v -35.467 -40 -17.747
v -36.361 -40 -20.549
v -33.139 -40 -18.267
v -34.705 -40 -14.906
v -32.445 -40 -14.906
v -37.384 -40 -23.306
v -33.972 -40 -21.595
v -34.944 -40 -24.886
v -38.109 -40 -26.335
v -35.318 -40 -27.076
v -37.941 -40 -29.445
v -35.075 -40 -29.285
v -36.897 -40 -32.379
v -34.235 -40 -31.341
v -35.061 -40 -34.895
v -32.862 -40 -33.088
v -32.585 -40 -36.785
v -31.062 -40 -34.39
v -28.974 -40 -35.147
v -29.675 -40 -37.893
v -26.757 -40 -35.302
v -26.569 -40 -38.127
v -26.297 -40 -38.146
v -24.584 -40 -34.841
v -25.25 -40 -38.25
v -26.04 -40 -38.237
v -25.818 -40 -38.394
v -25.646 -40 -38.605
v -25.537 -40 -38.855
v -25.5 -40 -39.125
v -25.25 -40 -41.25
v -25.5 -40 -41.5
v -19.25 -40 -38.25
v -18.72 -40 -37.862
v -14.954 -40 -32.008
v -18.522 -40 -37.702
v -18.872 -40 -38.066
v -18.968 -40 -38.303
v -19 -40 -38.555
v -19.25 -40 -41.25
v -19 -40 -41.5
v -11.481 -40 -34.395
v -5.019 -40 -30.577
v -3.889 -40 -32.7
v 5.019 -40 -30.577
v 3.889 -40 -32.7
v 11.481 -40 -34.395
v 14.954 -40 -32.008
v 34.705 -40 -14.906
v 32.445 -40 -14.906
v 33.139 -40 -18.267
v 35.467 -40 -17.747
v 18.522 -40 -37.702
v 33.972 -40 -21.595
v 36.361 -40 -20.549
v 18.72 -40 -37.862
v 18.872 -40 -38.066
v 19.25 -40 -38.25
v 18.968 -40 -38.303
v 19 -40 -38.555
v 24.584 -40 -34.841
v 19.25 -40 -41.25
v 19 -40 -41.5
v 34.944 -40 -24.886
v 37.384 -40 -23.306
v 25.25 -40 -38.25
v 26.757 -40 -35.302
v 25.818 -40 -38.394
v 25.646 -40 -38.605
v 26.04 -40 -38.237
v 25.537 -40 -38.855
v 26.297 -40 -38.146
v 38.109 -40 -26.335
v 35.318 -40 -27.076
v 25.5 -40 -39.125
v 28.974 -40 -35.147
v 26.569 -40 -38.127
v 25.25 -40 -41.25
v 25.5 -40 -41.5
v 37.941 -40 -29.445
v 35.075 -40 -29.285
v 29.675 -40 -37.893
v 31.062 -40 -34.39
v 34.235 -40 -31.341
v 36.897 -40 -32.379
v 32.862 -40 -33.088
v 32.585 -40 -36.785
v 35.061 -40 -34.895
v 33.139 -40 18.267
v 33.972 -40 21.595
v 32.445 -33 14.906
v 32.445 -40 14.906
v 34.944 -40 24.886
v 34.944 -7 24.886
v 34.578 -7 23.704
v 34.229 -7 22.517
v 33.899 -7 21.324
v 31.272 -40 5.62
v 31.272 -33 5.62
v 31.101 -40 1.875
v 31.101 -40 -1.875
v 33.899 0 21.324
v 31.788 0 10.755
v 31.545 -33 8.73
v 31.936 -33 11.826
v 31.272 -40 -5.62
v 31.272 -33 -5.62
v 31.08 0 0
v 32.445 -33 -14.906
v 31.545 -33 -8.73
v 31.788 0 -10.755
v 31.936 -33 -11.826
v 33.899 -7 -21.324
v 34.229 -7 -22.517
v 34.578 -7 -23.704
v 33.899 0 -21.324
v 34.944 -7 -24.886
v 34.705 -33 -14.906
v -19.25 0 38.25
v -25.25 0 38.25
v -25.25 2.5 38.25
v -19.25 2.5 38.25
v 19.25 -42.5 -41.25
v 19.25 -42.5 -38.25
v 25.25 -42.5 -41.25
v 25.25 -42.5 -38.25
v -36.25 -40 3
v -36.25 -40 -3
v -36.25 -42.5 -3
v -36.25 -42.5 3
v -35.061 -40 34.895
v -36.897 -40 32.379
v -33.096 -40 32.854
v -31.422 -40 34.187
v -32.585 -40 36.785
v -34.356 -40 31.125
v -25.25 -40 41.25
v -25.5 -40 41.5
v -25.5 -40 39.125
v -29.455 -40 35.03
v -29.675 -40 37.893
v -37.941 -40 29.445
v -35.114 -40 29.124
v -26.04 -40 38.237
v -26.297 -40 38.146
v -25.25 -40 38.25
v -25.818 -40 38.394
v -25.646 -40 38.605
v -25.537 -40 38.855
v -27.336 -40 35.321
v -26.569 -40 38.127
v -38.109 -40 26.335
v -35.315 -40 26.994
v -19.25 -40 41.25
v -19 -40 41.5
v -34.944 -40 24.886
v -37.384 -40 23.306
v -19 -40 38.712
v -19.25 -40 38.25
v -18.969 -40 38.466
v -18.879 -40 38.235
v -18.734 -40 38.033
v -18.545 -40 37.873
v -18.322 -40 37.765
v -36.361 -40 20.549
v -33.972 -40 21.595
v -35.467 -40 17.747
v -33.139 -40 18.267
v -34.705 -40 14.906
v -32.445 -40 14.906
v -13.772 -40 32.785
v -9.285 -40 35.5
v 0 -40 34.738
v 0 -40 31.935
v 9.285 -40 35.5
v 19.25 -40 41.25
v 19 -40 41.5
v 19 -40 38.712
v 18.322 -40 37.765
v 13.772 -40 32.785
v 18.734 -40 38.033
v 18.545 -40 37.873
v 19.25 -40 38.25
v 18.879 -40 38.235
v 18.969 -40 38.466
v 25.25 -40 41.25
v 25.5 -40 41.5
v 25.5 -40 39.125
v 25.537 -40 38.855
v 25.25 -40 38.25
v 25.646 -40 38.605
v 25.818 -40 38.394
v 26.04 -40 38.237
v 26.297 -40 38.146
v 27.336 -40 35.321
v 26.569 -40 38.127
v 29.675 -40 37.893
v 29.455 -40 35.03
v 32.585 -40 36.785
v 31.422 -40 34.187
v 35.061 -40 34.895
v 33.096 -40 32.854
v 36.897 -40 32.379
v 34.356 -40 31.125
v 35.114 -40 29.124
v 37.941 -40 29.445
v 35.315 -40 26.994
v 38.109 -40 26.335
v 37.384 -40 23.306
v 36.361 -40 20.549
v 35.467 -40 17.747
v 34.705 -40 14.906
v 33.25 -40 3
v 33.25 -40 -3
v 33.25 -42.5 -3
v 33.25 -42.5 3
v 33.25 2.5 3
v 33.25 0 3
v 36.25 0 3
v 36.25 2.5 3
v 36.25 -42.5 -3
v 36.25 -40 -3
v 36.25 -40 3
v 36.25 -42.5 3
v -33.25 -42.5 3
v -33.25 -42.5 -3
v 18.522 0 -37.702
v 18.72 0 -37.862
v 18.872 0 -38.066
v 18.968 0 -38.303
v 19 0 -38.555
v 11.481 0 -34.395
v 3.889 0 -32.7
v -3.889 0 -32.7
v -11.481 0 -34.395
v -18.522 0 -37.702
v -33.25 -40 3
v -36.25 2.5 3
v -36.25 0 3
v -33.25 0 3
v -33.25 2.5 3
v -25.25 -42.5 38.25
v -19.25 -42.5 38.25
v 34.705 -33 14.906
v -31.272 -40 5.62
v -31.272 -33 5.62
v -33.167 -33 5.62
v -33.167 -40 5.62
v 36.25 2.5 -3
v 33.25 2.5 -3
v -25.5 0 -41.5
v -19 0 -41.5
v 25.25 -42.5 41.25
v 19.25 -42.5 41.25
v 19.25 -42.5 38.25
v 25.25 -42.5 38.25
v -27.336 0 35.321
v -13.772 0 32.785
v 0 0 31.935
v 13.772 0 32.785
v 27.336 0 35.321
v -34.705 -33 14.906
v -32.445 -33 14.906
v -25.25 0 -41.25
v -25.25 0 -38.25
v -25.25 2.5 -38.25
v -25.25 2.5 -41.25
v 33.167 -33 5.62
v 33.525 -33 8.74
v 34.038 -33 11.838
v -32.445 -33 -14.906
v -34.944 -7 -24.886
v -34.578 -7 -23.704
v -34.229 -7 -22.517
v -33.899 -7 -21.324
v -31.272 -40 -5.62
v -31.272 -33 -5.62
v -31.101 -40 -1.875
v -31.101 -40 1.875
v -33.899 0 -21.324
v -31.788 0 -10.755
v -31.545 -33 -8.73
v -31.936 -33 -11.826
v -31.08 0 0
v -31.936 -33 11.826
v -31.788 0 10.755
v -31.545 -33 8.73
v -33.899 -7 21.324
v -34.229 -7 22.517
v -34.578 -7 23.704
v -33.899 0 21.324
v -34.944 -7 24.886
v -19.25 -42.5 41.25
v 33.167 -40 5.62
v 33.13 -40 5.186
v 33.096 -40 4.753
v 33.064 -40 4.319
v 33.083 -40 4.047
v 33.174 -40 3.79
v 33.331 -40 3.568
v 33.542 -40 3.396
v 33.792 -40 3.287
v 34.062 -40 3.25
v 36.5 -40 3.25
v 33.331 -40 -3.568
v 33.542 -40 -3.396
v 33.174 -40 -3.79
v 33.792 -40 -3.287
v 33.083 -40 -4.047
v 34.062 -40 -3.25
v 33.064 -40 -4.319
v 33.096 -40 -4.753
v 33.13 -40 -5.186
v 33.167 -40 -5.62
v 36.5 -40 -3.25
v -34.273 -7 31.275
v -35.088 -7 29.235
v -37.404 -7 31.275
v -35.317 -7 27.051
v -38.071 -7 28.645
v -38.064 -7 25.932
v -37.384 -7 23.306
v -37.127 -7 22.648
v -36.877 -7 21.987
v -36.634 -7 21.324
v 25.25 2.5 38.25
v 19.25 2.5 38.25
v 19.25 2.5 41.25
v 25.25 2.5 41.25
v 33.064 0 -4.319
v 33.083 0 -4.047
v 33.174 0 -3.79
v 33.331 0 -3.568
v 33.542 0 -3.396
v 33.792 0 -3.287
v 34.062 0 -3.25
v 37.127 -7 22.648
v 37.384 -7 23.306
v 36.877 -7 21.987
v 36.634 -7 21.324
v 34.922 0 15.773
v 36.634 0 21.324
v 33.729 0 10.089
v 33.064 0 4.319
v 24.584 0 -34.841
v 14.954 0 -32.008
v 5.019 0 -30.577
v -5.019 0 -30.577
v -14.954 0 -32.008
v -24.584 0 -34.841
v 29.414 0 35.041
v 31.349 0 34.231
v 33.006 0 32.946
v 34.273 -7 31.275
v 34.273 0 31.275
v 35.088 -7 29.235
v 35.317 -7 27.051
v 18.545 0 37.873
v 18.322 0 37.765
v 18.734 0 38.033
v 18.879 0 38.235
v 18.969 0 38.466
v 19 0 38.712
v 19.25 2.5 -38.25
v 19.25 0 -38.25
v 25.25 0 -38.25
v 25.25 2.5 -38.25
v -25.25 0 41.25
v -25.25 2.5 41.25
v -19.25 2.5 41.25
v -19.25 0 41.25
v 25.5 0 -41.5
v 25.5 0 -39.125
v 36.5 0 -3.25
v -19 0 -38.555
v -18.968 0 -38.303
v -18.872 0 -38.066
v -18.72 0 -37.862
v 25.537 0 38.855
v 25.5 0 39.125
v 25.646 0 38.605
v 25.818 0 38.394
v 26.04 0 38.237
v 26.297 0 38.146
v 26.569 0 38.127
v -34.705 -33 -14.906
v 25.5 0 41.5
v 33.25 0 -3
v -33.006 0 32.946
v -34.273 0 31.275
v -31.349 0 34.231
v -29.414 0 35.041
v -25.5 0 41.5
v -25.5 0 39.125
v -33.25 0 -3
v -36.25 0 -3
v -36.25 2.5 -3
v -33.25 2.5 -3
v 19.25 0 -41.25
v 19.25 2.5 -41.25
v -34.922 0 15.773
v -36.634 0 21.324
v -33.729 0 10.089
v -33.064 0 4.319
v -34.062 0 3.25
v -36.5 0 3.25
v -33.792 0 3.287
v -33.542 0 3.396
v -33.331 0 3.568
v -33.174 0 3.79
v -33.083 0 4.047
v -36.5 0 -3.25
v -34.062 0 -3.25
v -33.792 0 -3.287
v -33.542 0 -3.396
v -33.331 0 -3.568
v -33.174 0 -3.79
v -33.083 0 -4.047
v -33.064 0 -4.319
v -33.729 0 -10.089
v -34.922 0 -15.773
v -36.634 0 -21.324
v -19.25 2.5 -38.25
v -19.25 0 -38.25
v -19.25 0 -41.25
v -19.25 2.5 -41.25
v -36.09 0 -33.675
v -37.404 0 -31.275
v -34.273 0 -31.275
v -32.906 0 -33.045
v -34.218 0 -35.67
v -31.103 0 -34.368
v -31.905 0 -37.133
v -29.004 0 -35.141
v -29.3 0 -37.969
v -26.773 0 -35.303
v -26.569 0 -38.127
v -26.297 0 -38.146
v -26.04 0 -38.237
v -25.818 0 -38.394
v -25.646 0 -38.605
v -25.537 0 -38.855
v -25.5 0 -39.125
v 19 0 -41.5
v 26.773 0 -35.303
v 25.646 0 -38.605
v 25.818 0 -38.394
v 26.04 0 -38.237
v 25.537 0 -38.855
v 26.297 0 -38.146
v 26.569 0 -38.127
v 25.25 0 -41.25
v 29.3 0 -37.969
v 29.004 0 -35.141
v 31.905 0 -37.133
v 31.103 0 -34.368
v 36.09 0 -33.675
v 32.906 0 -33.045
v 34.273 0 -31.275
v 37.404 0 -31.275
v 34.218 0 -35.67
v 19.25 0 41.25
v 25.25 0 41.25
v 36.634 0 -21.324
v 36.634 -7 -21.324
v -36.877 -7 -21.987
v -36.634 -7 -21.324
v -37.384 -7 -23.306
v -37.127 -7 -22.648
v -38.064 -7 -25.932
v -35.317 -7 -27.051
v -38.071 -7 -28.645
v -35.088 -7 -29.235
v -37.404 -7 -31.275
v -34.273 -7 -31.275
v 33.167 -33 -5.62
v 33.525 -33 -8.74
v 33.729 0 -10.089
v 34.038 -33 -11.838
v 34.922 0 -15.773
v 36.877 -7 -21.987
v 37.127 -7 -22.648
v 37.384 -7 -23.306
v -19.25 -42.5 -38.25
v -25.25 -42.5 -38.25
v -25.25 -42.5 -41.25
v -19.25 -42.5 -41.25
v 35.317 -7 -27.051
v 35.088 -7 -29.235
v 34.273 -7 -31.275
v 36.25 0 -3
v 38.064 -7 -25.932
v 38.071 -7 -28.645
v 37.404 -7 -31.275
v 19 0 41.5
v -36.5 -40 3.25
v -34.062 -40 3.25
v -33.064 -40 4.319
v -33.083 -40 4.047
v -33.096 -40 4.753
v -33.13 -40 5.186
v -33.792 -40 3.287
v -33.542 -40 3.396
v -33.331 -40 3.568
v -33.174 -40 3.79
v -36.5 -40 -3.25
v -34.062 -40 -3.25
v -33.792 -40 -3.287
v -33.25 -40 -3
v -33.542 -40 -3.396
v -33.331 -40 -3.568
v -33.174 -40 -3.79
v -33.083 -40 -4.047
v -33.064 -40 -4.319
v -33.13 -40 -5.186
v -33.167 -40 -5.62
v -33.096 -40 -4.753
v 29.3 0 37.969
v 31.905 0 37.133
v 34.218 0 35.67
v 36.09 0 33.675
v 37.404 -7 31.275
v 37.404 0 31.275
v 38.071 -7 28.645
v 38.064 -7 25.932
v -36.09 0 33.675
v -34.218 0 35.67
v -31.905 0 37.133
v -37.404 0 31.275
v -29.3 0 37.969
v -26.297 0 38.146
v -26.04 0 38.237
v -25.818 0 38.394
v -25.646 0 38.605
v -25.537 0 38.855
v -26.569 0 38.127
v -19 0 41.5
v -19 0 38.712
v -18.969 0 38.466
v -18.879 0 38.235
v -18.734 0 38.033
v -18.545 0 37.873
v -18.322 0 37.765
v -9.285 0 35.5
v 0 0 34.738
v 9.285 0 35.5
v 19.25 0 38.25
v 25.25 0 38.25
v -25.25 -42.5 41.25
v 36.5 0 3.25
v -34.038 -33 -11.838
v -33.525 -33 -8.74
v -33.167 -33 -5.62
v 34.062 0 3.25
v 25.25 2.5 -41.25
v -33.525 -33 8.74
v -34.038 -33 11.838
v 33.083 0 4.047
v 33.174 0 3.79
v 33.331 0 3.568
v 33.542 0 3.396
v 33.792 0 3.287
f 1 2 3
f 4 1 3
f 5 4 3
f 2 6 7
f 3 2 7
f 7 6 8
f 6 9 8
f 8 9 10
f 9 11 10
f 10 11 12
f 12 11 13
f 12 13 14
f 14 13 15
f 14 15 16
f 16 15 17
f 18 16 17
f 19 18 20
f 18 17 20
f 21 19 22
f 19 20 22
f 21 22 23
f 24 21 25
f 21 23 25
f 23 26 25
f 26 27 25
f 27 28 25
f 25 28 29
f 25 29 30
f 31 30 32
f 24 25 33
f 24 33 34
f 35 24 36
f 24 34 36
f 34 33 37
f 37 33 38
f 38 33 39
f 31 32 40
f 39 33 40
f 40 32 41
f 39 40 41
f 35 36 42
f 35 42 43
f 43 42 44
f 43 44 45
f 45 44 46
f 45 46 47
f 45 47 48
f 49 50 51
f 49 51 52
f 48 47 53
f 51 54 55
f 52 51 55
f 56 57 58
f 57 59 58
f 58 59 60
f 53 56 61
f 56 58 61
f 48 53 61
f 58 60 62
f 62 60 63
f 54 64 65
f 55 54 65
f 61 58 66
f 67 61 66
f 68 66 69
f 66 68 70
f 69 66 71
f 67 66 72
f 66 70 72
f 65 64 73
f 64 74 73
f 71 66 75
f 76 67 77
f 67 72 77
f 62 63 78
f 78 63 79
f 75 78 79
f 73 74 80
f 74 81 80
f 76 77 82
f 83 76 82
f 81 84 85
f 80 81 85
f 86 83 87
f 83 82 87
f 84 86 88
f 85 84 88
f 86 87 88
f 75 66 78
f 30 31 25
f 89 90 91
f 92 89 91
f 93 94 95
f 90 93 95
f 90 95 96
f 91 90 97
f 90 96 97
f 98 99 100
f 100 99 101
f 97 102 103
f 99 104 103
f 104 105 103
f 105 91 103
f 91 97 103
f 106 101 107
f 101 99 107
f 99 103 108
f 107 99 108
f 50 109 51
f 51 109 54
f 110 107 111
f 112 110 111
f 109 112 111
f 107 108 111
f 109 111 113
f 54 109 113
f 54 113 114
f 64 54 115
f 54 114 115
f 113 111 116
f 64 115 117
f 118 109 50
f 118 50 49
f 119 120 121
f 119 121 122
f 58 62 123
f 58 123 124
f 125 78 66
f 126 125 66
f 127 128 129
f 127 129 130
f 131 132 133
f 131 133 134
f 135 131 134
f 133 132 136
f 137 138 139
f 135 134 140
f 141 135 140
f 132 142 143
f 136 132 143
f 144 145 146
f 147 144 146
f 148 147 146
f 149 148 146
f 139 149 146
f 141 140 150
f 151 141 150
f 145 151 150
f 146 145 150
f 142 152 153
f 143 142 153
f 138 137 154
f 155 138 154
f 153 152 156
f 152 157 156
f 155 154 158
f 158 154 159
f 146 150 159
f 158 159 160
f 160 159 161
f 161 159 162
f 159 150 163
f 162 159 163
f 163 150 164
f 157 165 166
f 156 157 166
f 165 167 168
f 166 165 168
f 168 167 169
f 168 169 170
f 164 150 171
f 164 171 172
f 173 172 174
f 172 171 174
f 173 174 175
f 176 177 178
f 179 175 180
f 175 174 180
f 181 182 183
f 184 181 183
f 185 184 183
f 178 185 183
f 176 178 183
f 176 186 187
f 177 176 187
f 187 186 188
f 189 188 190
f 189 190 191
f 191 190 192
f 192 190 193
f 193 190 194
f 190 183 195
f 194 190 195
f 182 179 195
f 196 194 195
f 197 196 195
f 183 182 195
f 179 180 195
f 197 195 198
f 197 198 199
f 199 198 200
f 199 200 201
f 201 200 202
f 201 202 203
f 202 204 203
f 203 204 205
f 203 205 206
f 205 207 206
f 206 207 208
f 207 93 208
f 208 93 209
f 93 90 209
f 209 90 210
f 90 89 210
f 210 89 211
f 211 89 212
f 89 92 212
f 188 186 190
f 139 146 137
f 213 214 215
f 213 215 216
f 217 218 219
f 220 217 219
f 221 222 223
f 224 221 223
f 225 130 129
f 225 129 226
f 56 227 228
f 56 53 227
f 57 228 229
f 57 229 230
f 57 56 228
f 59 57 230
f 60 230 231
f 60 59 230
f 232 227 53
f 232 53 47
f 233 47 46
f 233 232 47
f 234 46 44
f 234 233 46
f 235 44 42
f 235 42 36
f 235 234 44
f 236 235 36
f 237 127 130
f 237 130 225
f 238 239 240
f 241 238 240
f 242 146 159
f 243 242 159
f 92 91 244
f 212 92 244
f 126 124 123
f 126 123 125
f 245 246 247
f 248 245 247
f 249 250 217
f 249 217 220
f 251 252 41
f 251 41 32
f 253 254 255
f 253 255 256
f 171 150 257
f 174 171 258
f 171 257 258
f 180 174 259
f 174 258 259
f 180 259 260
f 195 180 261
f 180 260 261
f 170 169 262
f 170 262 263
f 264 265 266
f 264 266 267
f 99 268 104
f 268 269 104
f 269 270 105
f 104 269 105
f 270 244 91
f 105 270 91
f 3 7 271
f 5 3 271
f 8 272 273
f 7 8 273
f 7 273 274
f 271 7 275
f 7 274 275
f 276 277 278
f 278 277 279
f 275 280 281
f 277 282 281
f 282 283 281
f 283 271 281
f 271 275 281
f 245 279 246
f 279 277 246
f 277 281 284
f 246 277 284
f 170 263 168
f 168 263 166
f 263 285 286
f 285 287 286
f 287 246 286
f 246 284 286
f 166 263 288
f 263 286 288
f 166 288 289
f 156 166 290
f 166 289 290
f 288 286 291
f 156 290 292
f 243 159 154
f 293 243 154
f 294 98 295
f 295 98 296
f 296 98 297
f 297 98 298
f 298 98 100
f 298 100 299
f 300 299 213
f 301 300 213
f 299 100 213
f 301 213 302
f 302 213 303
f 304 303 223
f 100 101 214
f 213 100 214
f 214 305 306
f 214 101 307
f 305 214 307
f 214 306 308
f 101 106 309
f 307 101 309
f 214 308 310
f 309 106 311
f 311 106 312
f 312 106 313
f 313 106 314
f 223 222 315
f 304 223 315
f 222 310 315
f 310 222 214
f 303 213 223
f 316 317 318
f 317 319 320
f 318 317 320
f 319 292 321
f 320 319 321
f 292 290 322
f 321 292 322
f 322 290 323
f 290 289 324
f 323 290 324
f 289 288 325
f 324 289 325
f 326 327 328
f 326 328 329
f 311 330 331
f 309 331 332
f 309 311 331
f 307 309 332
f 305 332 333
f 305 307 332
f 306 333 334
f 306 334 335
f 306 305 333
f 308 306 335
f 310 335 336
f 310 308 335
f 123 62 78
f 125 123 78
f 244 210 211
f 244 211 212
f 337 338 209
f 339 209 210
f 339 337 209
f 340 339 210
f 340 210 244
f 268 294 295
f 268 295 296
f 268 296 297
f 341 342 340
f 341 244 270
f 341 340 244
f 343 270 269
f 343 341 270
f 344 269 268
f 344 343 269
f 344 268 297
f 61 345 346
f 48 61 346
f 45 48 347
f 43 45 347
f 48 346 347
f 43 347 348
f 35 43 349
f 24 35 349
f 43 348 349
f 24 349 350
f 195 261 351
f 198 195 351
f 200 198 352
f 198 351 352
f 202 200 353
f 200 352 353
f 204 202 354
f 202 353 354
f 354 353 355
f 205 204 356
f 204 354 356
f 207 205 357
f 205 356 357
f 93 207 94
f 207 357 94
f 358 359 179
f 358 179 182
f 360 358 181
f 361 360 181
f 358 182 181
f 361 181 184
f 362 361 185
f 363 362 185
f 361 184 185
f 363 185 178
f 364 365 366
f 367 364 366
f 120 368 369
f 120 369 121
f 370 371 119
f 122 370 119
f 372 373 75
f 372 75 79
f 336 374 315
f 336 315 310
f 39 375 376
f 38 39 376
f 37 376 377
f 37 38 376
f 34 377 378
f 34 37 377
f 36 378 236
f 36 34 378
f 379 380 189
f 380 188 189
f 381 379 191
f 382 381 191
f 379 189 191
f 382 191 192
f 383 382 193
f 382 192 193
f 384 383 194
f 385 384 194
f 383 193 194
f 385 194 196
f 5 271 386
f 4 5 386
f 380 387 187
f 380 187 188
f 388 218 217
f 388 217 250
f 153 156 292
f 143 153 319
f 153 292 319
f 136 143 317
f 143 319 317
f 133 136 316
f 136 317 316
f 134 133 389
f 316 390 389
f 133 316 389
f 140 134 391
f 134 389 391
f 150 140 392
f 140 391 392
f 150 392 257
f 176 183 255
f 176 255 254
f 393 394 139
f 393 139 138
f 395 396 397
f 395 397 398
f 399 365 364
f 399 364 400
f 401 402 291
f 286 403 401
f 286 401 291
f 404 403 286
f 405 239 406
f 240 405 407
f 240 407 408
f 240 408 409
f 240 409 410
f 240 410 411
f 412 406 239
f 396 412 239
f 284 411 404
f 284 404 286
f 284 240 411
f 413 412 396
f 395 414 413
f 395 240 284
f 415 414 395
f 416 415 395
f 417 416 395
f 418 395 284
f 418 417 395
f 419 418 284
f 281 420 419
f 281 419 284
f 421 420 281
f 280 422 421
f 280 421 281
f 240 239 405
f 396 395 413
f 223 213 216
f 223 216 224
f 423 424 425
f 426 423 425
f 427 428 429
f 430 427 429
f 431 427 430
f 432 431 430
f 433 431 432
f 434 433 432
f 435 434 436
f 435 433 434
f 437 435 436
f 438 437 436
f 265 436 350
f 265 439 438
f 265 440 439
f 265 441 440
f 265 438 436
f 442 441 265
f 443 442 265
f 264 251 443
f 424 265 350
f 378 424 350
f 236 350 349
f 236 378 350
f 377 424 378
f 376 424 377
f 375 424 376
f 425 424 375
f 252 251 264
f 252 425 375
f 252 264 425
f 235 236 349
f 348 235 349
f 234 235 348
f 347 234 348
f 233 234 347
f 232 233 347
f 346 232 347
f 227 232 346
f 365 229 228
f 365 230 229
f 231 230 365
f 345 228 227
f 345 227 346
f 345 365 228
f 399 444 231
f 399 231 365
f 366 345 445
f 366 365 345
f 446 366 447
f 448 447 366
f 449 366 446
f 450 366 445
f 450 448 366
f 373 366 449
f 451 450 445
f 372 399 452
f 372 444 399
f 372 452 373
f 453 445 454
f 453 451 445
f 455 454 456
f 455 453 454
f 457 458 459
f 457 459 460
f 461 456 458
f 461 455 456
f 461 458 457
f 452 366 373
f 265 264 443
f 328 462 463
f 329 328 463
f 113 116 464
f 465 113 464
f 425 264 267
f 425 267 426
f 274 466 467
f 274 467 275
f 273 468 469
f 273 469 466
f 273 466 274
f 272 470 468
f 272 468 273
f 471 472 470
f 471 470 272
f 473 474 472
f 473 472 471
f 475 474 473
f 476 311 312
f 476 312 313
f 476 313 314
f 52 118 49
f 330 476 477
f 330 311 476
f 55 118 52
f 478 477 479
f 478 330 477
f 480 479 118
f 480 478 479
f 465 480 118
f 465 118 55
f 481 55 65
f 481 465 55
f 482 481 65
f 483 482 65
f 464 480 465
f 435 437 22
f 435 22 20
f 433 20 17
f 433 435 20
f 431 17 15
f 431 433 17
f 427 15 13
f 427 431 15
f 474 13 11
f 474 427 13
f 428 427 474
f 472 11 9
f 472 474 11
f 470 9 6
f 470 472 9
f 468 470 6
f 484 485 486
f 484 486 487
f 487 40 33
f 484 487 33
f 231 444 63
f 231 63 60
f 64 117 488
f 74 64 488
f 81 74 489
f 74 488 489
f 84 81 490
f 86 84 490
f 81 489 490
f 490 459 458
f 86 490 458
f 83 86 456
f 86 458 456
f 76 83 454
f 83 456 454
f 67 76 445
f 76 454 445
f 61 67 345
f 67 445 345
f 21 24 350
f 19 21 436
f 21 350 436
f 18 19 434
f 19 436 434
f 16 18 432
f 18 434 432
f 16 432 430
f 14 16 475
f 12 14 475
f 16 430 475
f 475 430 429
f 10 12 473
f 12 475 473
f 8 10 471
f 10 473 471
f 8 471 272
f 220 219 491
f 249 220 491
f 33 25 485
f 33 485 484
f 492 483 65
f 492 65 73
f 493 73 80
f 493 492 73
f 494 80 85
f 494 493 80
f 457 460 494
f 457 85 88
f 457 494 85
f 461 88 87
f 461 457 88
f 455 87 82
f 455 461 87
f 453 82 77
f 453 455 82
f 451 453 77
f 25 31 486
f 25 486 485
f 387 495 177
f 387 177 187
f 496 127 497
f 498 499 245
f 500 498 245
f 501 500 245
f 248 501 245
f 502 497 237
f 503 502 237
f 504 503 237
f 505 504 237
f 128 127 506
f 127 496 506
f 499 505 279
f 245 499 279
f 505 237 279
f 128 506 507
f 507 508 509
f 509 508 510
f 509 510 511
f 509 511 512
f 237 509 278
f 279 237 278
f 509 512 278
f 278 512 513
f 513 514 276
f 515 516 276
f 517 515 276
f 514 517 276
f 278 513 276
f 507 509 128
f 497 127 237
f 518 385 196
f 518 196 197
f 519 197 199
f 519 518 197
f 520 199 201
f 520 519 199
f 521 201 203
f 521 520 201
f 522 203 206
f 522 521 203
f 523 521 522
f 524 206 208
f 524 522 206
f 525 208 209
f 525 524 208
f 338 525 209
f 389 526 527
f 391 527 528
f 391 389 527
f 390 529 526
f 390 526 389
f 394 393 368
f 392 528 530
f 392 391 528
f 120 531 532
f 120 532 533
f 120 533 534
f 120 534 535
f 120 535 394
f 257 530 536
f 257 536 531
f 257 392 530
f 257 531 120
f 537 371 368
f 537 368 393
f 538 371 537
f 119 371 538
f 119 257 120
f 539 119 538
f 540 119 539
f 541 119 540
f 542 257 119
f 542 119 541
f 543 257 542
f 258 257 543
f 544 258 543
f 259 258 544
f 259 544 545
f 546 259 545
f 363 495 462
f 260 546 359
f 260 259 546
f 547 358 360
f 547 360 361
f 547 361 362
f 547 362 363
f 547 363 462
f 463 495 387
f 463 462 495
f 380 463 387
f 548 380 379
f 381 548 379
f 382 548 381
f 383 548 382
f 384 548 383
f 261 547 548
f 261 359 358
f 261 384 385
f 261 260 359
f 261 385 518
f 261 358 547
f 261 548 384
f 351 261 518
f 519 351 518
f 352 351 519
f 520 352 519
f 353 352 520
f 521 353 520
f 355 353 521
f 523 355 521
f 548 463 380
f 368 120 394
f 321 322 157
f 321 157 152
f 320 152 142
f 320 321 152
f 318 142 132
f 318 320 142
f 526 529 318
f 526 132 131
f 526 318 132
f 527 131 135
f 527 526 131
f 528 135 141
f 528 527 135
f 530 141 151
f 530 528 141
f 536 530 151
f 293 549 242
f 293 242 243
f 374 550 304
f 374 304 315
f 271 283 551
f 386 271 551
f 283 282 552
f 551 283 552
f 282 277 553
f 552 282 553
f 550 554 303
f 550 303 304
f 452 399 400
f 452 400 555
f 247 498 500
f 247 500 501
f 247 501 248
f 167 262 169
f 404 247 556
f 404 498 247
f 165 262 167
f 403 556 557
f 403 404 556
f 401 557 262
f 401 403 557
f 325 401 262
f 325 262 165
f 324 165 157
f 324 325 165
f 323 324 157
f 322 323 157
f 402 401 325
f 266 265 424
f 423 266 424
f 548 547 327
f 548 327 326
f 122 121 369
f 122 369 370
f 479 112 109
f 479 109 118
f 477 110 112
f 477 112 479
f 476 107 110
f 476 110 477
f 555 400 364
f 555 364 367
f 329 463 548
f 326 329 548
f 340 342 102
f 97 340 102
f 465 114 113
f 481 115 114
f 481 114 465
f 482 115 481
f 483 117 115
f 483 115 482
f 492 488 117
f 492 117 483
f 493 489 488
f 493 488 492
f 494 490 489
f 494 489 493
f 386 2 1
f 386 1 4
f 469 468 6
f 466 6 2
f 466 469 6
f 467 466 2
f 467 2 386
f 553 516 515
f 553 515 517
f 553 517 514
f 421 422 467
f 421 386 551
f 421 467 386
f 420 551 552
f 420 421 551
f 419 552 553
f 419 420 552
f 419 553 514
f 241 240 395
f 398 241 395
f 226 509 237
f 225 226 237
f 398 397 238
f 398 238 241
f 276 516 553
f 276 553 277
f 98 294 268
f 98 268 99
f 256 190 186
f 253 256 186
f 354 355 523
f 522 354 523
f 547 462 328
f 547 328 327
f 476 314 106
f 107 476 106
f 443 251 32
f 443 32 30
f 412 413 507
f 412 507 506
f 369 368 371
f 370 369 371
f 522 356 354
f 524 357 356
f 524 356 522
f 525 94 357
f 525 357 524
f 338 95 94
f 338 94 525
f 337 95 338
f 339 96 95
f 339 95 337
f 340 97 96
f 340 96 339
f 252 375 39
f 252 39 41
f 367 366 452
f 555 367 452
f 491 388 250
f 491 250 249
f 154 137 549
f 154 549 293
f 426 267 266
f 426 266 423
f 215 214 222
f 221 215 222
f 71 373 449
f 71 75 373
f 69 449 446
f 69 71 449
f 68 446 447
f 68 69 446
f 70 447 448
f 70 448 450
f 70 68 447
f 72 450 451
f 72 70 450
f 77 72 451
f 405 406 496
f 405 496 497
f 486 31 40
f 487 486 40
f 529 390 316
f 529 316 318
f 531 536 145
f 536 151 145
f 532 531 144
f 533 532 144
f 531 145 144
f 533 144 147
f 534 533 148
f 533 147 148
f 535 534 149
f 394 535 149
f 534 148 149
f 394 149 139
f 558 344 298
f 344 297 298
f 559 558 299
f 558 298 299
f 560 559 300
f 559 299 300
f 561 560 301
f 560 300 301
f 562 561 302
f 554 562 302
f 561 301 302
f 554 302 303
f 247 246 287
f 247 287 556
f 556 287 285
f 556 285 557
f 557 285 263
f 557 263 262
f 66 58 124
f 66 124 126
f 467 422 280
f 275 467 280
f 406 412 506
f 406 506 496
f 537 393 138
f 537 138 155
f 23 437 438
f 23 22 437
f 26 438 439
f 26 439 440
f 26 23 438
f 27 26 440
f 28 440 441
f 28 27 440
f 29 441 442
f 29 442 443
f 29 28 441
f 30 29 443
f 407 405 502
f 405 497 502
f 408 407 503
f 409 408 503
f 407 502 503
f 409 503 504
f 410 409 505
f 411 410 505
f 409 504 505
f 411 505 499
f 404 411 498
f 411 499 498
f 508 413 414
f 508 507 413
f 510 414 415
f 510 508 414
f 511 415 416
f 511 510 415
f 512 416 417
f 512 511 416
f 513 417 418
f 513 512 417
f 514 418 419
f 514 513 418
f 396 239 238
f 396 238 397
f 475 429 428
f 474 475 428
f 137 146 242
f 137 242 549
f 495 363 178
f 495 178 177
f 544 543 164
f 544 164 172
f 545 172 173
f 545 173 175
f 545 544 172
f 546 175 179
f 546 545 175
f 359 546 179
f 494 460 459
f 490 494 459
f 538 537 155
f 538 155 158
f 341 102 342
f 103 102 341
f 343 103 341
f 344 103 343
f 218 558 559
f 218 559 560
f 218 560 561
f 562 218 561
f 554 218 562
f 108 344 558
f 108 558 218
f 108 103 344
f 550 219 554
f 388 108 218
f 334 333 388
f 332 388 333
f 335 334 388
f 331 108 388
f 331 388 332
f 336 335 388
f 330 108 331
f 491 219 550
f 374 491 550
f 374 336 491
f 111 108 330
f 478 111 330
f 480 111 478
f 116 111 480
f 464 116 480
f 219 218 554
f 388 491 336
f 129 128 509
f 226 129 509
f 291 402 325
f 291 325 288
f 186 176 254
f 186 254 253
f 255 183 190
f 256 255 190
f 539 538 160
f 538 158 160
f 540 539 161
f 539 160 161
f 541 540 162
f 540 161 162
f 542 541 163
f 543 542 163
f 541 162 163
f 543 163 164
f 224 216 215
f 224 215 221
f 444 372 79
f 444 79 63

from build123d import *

# Parameters (mm, degrees)
EXTRUDE_1_DEPTH        = 40
SKETCH_5_W             = 3
SKETCH_5_H             = 6
SKETCH_5_W_2           = 6
SKETCH_5_H_2           = 3
EXTRUDE_3_DEPTH        = 2.5
SKETCH_6_W             = 6
SKETCH_6_H             = 3
SKETCH_6_W_2           = 3
SKETCH_6_H_2           = 6
EXTRUDE_4_DEPTH        = 2.5
FILLET_1_R             = 1
CUT_EXTRUDE_8754_DEPTH = 7
CUT_EXTRUDE_START      = -7
CUT_EXTRUDE_9199_DEPTH = 7


with BuildPart() as part:
    # 草图2 → 凸台-拉伸1 (new body)
    with BuildSketch(Plane(origin=(0, 0, 0), x_dir=(1, 0, 0), z_dir=(0, 1, 0))):
        with BuildLine():
            Line((-33, 3.25), (-36.5, 3.25))
            Line((-36.5, 3.25), (-36.5, -3.25))
            Line((-36.5, -3.25), (-33, -3.25))
            ThreePointArc((-33, -3.25), (-34.3699608, -13.457697281), (-37.384420147, -23.305890579))
            ThreePointArc((-37.384420147, -23.305890579), (-35.741677738, -34.13030337), (-25.5, -38))
            Line((-25.5, -38), (-25.5, -41.5))
            Line((-25.5, -41.5), (-19, -41.5))
            Line((-19, -41.5), (-19, -38))
            ThreePointArc((-19, -38), (0, -34.737686486), (19, -38))
            Line((19, -38), (19, -41.5))
            Line((19, -41.5), (25.5, -41.5))
            Line((25.5, -41.5), (25.5, -38))
            ThreePointArc((25.5, -38), (35.741677738, -34.13030337), (37.384420147, -23.305890579))
            ThreePointArc((37.384420147, -23.305890579), (34.3699608, -13.457697281), (33, -3.25))
            Line((33, -3.25), (36.5, -3.25))
            Line((36.5, -3.25), (36.5, 3.25))
            Line((36.5, 3.25), (33, 3.25))
            ThreePointArc((33, 3.25), (34.3699608, 13.457697281), (37.384420147, 23.305890579))
            ThreePointArc((37.384420147, 23.305890579), (35.741677738, 34.13030337), (25.5, 38))
            Line((25.5, 38), (25.5, 41.5))
            Line((25.5, 41.5), (19, 41.5))
            Line((19, 41.5), (19, 38))
            ThreePointArc((19, 38), (0, 32.48661644), (-19, 38))
            Line((-19, 38), (-19, 41.5))
            Line((-19, 41.5), (-25.5, 41.5))
            Line((-25.5, 41.5), (-25.5, 38))
            ThreePointArc((-25.5, 38), (-35.741677738, 34.13030337), (-37.384420147, 23.305890579))
            ThreePointArc((-37.384420147, 23.305890579), (-34.3699608, 13.457697281), (-33, 3.25))
        make_face()
        with BuildLine():
            ThreePointArc((-24.584159113, 34.841334273), (-32.862117731, 33.087897358), (-34.944211337, 24.886432483))
            ThreePointArc((-34.944211337, 24.886432483), (-31.079757149, 0), (-34.944211337, -24.886432483))
            ThreePointArc((-34.944211337, -24.886432483), (-33.784066651, -32.031796166), (-27.335670062, -35.32122458))
            ThreePointArc((-27.335670062, -35.32122458), (0, -31.93514908), (27.335670062, -35.32122458))
            ThreePointArc((27.335670062, -35.32122458), (33.784066651, -32.031796166), (34.944211337, -24.886432483))
            ThreePointArc((34.944211337, -24.886432483), (31.079757149, 0), (34.944211337, 24.886432483))
            ThreePointArc((34.944211337, 24.886432483), (32.862117731, 33.087897358), (24.584159113, 34.841334273))
            ThreePointArc((24.584159113, 34.841334273), (0, 30.397281148), (-24.584159113, 34.841334273))
        make_face(mode=Mode.SUBTRACT)
    extrude(amount=-EXTRUDE_1_DEPTH)

    # 草图5 → 凸台-拉伸3 (add)
    with BuildSketch(Plane(origin=(0, 0, 0), x_dir=(1, 0, 0), z_dir=(0, 1, 0))):
        with Locations((-34.75, 0)):
            Rectangle(SKETCH_5_W, SKETCH_5_H)
        with Locations((-22.25, -39.75)):
            Rectangle(SKETCH_5_W_2, SKETCH_5_H_2)
        with Locations((-22.25, 39.75)):
            Rectangle(SKETCH_5_W_2, SKETCH_5_H_2)
        with Locations((22.25, 39.75)):
            Rectangle(SKETCH_5_W_2, SKETCH_5_H_2)
        with Locations((22.25, -39.75)):
            Rectangle(SKETCH_5_W_2, SKETCH_5_H_2)
        with Locations((34.75, 0)):
            Rectangle(SKETCH_5_W, SKETCH_5_H)
    extrude(amount=EXTRUDE_3_DEPTH)

    # 草图6 → 凸台-拉伸4 (add)
    with BuildSketch(Plane.XZ.offset(40)):
        with Locations((-22.25, 39.75)):
            Rectangle(SKETCH_6_W, SKETCH_6_H)
        with Locations((-34.75, 0)):
            Rectangle(SKETCH_6_W_2, SKETCH_6_H_2)
        with Locations((-22.25, -39.75)):
            Rectangle(SKETCH_6_W, SKETCH_6_H)
        with Locations((22.25, 39.75)):
            Rectangle(SKETCH_6_W, SKETCH_6_H)
        with Locations((22.25, -39.75)):
            Rectangle(SKETCH_6_W, SKETCH_6_H)
        with Locations((34.75, 0)):
            Rectangle(SKETCH_6_W_2, SKETCH_6_H_2)
    extrude(amount=EXTRUDE_4_DEPTH)

    # 圆角1
    fillet_1_edges = [part.edges().sort_by_distance(p)[0] for p in [
        (-25.5, -20, -38),
        (-19, -20, -38),
        (19, -20, -38),
        (25.5, -20, -38),
        (33, -20, -3.25),
        (33, -20, 3.25),
        (25.5, -20, 38),
        (19, -20, 38),
        (-19, -20, 38),
        (-25.5, -20, 38),
        (-33, -20, 3.25),
        (-33, -20, -3.25),
    ]]
    fillet(fillet_1_edges, radius=FILLET_1_R)

    # 草图7 → Cut-Extrude 8754 (cut)
    with BuildSketch(Plane(origin=(0, 0, 0), x_dir=(1, 0, 0), z_dir=(0, 1, 0))):
        with BuildLine():
            Line((-36.633725749, -21.323718343), (-33.898557891, -21.323718343))
            ThreePointArc((-33.898557891, -21.323718343), (-34.401232724, -23.110989975), (-34.944211337, -24.886432483))
            ThreePointArc((-34.944211337, -24.886432483), (-35.274550553, -28.150449442), (-34.273344825, -31.274632183))
            Line((-34.273344825, -31.274632183), (-37.421883074, -31.274632183))
            ThreePointArc((-37.421883074, -31.274632183), (-38.165581654, -27.580951917), (-37.605977079, -23.854934713))
            ThreePointArc((-37.605977079, -23.854934713), (-37.106234952, -22.594556671), (-36.633725749, -21.323718343))
        make_face()
        with BuildLine():
            Line((36.633725749, -21.323718343), (33.898557891, -21.323718343))
            ThreePointArc((33.898557891, -21.323718343), (34.401232724, -23.110989975), (34.944211337, -24.886432483))
            ThreePointArc((34.944211337, -24.886432483), (35.274550553, -28.150449442), (34.273344825, -31.274632183))
            Line((34.273344825, -31.274632183), (37.421883074, -31.274632183))
            ThreePointArc((37.421883074, -31.274632183), (38.165581654, -27.580951917), (37.605977079, -23.854934713))
            ThreePointArc((37.605977079, -23.854934713), (37.106234952, -22.594556671), (36.633725749, -21.323718343))
        make_face()
        with BuildLine():
            Line((-36.633725749, 21.323718343), (-33.898557891, 21.323718343))
            ThreePointArc((-33.898557891, 21.323718343), (-34.401232724, 23.110989975), (-34.944211337, 24.886432483))
            ThreePointArc((-34.944211337, 24.886432483), (-35.274550553, 28.150449442), (-34.273344825, 31.274632183))
            Line((-34.273344825, 31.274632183), (-37.421883074, 31.274632183))
            ThreePointArc((-37.421883074, 31.274632183), (-38.165581654, 27.580951917), (-37.605977079, 23.854934713))
            ThreePointArc((-37.605977079, 23.854934713), (-37.106234952, 22.594556671), (-36.633725749, 21.323718343))
        make_face()
        with BuildLine():
            Line((37.421883074, 31.274632183), (34.273344825, 31.274632183))
            ThreePointArc((34.273344825, 31.274632183), (35.274550553, 28.150449442), (34.944211337, 24.886432483))
            ThreePointArc((34.944211337, 24.886432483), (34.401232724, 23.110989975), (33.898557891, 21.323718343))
            Line((33.898557891, 21.323718343), (36.633725749, 21.323718343))
            ThreePointArc((36.633725749, 21.323718343), (37.106234952, 22.594556671), (37.605977079, 23.854934713))
            ThreePointArc((37.605977079, 23.854934713), (38.165581654, 27.580951917), (37.421883074, 31.274632183))
        make_face()
    extrude(amount=-CUT_EXTRUDE_8754_DEPTH, mode=Mode.SUBTRACT)

    # 草图8 → Cut-Extrude 9199 (cut)
    with BuildSketch(Plane.XZ.offset(40).offset(CUT_EXTRUDE_START)):
        with BuildLine():
            Line((-33.167247328, -5.619996041), (-31.272419616, -5.619996041))
            ThreePointArc((-31.272419616, -5.619996041), (-31.726152882, -10.279804399), (-32.444885624, -14.906154046))
            Line((-32.444885624, -14.906154046), (-34.704557814, -14.906154046))
            ThreePointArc((-34.704557814, -14.906154046), (-33.762273508, -10.291819093), (-33.167247328, -5.619996041))
        make_face()
        with BuildLine():
            Line((-34.704557814, 14.906154046), (-32.444885624, 14.906154046))
            ThreePointArc((-32.444885624, 14.906154046), (-31.726152882, 10.279804399), (-31.272419616, 5.619996041))
            Line((-31.272419616, 5.619996041), (-33.167247328, 5.619996041))
            ThreePointArc((-33.167247328, 5.619996041), (-33.762273508, 10.291819093), (-34.704557814, 14.906154046))
        make_face()
        with BuildLine():
            Line((33.167247328, -5.619996041), (31.272419616, -5.619996041))
            ThreePointArc((31.272419616, -5.619996041), (31.726152882, -10.279804399), (32.444885624, -14.906154046))
            Line((32.444885624, -14.906154046), (34.704557814, -14.906154046))
            ThreePointArc((34.704557814, -14.906154046), (33.762273508, -10.291819093), (33.167247328, -5.619996041))
        make_face()
        with BuildLine():
            Line((33.167247328, 5.619996041), (31.272419616, 5.619996041))
            ThreePointArc((31.272419616, 5.619996041), (31.726152882, 10.279804399), (32.444885624, 14.906154046))
            Line((32.444885624, 14.906154046), (34.704557814, 14.906154046))
            ThreePointArc((34.704557814, 14.906154046), (33.762273508, 10.291819093), (33.167247328, 5.619996041))
        make_face()
    extrude(amount=CUT_EXTRUDE_9199_DEPTH, mode=Mode.SUBTRACT)


solid = part.part
